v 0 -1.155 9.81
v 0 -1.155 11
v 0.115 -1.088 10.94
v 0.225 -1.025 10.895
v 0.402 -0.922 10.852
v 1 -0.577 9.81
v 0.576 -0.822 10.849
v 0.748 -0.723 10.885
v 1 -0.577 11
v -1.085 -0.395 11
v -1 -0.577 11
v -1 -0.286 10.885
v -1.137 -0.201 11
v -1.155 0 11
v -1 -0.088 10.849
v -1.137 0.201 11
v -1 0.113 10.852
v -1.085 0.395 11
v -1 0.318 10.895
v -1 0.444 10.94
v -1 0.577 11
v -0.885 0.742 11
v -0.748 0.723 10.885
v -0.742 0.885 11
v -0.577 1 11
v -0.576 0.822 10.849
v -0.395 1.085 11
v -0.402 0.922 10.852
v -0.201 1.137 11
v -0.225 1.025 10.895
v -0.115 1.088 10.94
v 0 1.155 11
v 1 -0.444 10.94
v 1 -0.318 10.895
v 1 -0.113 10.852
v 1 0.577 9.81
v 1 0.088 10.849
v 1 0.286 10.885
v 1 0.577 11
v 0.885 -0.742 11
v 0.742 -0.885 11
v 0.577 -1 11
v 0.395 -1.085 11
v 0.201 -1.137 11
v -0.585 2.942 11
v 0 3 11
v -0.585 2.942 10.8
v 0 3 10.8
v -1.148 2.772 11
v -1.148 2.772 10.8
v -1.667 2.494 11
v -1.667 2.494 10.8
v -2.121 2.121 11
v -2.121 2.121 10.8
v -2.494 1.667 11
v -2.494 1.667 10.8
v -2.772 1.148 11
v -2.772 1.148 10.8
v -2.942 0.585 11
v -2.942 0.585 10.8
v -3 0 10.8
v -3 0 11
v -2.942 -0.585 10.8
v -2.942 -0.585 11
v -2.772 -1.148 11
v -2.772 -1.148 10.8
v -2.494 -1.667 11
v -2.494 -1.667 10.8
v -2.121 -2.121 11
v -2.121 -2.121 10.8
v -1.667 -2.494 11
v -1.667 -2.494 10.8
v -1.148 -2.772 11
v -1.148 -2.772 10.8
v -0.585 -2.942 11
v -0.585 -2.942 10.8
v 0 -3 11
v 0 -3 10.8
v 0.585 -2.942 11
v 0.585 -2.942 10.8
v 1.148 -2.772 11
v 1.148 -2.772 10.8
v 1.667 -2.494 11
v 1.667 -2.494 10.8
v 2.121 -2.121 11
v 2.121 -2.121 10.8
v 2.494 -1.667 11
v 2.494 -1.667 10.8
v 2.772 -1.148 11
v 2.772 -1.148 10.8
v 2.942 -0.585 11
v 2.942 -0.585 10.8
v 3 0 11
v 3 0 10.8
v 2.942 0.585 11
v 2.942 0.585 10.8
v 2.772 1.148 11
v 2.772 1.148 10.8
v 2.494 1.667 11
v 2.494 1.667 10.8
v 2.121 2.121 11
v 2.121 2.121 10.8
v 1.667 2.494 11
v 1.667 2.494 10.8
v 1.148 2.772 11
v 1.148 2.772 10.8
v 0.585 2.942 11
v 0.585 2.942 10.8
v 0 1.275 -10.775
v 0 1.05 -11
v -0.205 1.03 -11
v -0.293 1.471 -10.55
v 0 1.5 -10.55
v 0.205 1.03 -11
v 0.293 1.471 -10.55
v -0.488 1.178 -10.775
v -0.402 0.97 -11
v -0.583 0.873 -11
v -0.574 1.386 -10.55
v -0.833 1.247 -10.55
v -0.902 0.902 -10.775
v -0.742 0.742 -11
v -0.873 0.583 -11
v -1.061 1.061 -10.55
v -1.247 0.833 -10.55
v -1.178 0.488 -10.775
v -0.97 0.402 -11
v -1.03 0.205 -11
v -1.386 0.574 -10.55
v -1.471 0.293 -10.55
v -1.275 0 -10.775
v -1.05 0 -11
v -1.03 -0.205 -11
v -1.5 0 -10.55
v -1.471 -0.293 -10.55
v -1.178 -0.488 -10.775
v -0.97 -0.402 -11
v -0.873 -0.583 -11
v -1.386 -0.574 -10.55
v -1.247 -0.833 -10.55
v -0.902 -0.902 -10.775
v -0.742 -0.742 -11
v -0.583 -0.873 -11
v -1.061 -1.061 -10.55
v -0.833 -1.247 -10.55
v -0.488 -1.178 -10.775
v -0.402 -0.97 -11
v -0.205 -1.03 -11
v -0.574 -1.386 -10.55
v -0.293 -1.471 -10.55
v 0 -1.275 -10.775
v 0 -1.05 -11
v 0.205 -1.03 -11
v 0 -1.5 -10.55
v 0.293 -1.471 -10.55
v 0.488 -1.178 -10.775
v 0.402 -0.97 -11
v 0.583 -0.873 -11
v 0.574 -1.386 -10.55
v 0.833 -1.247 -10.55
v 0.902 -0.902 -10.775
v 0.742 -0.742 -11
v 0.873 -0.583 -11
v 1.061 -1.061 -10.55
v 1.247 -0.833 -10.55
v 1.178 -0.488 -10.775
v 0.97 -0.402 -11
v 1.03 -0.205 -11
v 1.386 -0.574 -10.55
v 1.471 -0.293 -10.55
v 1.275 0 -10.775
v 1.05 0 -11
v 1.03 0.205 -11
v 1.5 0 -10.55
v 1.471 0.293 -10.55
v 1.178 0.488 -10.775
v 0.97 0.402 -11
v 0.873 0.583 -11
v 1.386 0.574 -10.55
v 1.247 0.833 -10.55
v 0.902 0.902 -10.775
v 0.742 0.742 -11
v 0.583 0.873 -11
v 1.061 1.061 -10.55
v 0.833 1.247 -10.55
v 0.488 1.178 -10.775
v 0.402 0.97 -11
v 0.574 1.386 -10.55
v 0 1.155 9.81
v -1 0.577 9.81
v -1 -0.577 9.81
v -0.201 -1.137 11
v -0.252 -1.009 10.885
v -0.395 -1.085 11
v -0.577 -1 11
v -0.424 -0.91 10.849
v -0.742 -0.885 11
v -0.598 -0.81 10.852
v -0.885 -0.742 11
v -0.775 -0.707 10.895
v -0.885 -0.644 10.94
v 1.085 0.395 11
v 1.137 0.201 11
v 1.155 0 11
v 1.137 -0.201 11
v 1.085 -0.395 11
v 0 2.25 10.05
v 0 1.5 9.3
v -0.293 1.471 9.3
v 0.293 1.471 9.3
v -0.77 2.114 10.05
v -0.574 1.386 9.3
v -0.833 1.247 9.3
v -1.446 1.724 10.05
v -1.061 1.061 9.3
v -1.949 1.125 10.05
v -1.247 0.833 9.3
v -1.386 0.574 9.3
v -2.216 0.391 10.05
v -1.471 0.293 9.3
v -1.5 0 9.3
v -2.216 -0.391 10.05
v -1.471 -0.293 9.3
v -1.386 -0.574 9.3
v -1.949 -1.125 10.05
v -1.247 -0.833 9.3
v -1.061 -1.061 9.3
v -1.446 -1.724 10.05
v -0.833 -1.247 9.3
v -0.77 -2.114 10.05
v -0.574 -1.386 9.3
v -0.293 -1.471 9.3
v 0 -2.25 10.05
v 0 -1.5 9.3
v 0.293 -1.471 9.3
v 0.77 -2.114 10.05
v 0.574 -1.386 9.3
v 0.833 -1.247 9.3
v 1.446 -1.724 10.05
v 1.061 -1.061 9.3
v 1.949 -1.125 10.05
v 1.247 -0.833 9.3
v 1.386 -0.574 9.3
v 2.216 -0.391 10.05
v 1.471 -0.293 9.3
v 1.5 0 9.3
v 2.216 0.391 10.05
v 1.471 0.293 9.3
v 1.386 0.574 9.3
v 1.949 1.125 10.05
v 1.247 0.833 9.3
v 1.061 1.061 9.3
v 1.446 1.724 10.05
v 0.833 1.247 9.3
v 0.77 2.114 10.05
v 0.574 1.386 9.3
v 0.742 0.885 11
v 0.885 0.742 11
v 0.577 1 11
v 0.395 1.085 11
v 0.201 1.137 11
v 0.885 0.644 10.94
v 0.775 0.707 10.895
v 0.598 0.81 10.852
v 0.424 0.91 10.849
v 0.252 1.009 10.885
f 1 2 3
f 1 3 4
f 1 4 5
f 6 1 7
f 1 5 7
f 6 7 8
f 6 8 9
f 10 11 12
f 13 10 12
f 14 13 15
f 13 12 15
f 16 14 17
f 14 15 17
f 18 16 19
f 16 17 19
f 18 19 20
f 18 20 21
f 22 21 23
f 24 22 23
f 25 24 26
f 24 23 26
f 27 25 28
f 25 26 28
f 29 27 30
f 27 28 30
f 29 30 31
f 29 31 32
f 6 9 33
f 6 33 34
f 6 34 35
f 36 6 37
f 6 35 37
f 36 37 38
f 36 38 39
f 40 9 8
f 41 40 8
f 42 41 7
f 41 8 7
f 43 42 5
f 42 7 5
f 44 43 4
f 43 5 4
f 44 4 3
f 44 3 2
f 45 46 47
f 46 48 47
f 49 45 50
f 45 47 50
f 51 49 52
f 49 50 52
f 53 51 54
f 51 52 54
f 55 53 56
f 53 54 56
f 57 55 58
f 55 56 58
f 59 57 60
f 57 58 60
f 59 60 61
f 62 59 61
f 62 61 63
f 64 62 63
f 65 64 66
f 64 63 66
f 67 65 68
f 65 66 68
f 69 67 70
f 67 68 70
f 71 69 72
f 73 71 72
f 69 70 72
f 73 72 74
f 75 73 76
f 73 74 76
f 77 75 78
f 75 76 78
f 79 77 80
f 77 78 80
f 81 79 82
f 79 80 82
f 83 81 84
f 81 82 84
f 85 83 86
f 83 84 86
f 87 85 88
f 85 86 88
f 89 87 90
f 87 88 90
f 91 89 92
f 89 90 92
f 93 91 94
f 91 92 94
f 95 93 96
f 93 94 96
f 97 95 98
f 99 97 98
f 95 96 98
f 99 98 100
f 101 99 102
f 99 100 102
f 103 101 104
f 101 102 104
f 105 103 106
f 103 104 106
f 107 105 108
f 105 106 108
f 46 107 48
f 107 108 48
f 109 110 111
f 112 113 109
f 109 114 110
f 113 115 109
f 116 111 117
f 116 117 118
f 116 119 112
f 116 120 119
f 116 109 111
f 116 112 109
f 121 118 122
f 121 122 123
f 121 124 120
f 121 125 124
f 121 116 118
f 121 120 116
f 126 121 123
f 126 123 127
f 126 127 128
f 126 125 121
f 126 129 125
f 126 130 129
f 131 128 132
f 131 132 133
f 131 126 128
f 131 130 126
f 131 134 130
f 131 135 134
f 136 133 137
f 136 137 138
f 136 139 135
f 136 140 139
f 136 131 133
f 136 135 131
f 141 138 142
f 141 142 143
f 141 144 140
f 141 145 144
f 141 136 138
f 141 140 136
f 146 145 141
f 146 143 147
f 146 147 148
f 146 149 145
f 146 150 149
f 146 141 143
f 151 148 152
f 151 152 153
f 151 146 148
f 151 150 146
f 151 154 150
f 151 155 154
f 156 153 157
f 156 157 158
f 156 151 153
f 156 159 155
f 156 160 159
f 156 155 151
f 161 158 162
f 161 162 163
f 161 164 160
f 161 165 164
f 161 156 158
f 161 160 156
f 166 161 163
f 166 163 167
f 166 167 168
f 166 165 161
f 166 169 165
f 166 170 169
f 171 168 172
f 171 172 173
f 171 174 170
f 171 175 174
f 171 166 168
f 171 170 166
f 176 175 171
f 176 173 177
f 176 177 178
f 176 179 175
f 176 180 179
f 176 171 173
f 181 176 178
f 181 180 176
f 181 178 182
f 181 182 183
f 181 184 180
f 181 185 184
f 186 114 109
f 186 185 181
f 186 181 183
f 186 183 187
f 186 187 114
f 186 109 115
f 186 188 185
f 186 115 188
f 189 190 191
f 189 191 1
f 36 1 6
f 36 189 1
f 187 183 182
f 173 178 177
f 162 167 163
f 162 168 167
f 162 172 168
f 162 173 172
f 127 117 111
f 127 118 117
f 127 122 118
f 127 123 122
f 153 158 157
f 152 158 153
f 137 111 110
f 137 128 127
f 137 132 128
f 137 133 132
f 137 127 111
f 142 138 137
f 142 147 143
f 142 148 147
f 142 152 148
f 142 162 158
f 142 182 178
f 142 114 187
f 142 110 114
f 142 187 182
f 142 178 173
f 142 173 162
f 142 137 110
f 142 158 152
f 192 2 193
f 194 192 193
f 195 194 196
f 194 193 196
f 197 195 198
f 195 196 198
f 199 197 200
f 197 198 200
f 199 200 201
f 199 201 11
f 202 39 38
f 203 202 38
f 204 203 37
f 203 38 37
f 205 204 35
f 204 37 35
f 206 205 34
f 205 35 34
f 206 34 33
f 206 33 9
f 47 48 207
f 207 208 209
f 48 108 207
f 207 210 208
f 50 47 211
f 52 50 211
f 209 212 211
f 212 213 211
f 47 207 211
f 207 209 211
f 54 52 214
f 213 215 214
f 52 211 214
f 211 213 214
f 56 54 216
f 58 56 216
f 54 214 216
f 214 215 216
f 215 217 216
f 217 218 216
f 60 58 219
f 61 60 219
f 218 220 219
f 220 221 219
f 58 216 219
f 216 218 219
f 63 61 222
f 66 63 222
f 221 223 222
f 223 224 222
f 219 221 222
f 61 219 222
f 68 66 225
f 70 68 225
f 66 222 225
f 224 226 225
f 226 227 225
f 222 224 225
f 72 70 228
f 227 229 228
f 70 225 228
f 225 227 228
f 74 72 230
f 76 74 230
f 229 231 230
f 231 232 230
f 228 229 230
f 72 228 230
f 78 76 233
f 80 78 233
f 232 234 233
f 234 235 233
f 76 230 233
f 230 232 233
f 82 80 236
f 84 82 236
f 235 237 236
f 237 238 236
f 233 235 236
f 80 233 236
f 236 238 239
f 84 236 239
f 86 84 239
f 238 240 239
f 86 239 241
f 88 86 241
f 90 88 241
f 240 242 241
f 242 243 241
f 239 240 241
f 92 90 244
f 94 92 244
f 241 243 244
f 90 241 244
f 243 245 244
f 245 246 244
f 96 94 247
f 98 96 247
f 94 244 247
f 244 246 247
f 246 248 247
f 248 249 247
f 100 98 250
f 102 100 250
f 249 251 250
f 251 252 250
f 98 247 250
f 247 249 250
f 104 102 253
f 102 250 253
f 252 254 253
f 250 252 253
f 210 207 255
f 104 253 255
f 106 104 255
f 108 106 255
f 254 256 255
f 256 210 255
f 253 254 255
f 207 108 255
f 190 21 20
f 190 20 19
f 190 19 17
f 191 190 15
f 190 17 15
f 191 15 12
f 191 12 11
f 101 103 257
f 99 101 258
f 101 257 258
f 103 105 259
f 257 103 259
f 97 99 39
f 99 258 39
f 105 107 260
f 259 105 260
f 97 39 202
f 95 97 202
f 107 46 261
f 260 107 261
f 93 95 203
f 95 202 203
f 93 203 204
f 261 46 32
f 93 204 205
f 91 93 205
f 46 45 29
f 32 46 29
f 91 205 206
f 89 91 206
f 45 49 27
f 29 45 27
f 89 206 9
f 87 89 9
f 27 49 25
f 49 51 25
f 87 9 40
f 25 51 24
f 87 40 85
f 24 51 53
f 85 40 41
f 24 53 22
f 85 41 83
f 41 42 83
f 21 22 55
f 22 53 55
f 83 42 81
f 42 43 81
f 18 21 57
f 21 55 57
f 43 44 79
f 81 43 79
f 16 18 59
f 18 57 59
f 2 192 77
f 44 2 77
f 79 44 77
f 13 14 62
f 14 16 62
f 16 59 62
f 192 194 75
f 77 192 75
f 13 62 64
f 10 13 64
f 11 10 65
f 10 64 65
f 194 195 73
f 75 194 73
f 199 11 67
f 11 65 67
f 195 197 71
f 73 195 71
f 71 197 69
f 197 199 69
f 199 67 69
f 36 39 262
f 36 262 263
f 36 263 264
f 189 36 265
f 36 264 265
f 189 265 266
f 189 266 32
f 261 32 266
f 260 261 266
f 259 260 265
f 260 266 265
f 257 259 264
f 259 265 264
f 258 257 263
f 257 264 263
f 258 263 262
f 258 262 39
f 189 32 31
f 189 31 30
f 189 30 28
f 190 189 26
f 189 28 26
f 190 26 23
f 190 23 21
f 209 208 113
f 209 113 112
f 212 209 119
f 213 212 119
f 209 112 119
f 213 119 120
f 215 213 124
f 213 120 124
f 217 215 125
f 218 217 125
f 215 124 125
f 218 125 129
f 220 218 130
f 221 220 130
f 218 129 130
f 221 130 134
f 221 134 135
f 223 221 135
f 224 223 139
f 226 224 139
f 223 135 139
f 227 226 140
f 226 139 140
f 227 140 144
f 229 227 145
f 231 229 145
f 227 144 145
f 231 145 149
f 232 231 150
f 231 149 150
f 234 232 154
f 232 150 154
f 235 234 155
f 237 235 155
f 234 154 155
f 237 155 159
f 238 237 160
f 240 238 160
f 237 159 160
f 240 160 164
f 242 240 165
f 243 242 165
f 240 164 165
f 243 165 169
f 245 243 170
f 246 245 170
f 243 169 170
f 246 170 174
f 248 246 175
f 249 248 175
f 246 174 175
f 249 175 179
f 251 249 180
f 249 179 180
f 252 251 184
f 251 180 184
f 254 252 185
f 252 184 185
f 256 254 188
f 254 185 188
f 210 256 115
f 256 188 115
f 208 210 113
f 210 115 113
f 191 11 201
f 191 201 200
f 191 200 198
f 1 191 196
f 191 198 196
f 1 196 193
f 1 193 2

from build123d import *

# Parameters (mm, degrees)
SKETCH3_W          = 22
SKETCH3_H          = 1.5
CHAMFER1_SIZE      = 0.45
CUT_EXTRUDE1_DEPTH = 1.19


with BuildPart() as part:
    # Sketch3 → Revolve1 (revolve)
    with BuildSketch(Plane(origin=(0, 0, 0), x_dir=(0, 0, -1), z_dir=(1, 0, 0))):
        with Locations((0, 0.75)):
            Rectangle(SKETCH3_W, SKETCH3_H)
    revolve(axis=Axis((0, 0, -11), (0, 0, 1)))

    # Chamfer1
    chamfer1_edges = [part.edges().sort_by_distance(p)[0] for p in [
        (0, -1.5, -11),
    ]]
    chamfer(chamfer1_edges, length=CHAMFER1_SIZE)

    # Sketch6 → Revolve2 (revolve)
    with BuildSketch(Plane(origin=(0, 0, 0), x_dir=(0, 0, -1), z_dir=(1, 0, 0))):
        Polygon((-11, 3), (-10.8, 3), (-9.3, 1.5), (-9.3, 0), (-11, 0), align=None)
    revolve(axis=Axis((0, 0, -11), (0, 0, 1)))

    # Sketch8 → Cut-Extrude1 (cut)
    with BuildSketch(Plane.XY.offset(11)):
        Polygon((0, 1.154700538), (-1, 0.577350269), (-1, -0.577350269), (0, -1.154700538), (1, -0.577350269), (1, 0.577350269), align=None)
    extrude(amount=-CUT_EXTRUDE1_DEPTH, mode=Mode.SUBTRACT)

    # Cut-Extrude2 cone 1 section (through the dimple's axis) → Cut-Extrude2 (revolve, cut)
    with BuildSketch(Plane(origin=(0, 0, 11), x_dir=(0, -1, 0), z_dir=(1, 0, 0))):
        Polygon((0, 0), (1.154700538, 0), (0, 1.154700538), align=None)
    revolve(axis=Axis((0, 0, 11), (0, 0, -1)), mode=Mode.SUBTRACT)


solid = part.part
